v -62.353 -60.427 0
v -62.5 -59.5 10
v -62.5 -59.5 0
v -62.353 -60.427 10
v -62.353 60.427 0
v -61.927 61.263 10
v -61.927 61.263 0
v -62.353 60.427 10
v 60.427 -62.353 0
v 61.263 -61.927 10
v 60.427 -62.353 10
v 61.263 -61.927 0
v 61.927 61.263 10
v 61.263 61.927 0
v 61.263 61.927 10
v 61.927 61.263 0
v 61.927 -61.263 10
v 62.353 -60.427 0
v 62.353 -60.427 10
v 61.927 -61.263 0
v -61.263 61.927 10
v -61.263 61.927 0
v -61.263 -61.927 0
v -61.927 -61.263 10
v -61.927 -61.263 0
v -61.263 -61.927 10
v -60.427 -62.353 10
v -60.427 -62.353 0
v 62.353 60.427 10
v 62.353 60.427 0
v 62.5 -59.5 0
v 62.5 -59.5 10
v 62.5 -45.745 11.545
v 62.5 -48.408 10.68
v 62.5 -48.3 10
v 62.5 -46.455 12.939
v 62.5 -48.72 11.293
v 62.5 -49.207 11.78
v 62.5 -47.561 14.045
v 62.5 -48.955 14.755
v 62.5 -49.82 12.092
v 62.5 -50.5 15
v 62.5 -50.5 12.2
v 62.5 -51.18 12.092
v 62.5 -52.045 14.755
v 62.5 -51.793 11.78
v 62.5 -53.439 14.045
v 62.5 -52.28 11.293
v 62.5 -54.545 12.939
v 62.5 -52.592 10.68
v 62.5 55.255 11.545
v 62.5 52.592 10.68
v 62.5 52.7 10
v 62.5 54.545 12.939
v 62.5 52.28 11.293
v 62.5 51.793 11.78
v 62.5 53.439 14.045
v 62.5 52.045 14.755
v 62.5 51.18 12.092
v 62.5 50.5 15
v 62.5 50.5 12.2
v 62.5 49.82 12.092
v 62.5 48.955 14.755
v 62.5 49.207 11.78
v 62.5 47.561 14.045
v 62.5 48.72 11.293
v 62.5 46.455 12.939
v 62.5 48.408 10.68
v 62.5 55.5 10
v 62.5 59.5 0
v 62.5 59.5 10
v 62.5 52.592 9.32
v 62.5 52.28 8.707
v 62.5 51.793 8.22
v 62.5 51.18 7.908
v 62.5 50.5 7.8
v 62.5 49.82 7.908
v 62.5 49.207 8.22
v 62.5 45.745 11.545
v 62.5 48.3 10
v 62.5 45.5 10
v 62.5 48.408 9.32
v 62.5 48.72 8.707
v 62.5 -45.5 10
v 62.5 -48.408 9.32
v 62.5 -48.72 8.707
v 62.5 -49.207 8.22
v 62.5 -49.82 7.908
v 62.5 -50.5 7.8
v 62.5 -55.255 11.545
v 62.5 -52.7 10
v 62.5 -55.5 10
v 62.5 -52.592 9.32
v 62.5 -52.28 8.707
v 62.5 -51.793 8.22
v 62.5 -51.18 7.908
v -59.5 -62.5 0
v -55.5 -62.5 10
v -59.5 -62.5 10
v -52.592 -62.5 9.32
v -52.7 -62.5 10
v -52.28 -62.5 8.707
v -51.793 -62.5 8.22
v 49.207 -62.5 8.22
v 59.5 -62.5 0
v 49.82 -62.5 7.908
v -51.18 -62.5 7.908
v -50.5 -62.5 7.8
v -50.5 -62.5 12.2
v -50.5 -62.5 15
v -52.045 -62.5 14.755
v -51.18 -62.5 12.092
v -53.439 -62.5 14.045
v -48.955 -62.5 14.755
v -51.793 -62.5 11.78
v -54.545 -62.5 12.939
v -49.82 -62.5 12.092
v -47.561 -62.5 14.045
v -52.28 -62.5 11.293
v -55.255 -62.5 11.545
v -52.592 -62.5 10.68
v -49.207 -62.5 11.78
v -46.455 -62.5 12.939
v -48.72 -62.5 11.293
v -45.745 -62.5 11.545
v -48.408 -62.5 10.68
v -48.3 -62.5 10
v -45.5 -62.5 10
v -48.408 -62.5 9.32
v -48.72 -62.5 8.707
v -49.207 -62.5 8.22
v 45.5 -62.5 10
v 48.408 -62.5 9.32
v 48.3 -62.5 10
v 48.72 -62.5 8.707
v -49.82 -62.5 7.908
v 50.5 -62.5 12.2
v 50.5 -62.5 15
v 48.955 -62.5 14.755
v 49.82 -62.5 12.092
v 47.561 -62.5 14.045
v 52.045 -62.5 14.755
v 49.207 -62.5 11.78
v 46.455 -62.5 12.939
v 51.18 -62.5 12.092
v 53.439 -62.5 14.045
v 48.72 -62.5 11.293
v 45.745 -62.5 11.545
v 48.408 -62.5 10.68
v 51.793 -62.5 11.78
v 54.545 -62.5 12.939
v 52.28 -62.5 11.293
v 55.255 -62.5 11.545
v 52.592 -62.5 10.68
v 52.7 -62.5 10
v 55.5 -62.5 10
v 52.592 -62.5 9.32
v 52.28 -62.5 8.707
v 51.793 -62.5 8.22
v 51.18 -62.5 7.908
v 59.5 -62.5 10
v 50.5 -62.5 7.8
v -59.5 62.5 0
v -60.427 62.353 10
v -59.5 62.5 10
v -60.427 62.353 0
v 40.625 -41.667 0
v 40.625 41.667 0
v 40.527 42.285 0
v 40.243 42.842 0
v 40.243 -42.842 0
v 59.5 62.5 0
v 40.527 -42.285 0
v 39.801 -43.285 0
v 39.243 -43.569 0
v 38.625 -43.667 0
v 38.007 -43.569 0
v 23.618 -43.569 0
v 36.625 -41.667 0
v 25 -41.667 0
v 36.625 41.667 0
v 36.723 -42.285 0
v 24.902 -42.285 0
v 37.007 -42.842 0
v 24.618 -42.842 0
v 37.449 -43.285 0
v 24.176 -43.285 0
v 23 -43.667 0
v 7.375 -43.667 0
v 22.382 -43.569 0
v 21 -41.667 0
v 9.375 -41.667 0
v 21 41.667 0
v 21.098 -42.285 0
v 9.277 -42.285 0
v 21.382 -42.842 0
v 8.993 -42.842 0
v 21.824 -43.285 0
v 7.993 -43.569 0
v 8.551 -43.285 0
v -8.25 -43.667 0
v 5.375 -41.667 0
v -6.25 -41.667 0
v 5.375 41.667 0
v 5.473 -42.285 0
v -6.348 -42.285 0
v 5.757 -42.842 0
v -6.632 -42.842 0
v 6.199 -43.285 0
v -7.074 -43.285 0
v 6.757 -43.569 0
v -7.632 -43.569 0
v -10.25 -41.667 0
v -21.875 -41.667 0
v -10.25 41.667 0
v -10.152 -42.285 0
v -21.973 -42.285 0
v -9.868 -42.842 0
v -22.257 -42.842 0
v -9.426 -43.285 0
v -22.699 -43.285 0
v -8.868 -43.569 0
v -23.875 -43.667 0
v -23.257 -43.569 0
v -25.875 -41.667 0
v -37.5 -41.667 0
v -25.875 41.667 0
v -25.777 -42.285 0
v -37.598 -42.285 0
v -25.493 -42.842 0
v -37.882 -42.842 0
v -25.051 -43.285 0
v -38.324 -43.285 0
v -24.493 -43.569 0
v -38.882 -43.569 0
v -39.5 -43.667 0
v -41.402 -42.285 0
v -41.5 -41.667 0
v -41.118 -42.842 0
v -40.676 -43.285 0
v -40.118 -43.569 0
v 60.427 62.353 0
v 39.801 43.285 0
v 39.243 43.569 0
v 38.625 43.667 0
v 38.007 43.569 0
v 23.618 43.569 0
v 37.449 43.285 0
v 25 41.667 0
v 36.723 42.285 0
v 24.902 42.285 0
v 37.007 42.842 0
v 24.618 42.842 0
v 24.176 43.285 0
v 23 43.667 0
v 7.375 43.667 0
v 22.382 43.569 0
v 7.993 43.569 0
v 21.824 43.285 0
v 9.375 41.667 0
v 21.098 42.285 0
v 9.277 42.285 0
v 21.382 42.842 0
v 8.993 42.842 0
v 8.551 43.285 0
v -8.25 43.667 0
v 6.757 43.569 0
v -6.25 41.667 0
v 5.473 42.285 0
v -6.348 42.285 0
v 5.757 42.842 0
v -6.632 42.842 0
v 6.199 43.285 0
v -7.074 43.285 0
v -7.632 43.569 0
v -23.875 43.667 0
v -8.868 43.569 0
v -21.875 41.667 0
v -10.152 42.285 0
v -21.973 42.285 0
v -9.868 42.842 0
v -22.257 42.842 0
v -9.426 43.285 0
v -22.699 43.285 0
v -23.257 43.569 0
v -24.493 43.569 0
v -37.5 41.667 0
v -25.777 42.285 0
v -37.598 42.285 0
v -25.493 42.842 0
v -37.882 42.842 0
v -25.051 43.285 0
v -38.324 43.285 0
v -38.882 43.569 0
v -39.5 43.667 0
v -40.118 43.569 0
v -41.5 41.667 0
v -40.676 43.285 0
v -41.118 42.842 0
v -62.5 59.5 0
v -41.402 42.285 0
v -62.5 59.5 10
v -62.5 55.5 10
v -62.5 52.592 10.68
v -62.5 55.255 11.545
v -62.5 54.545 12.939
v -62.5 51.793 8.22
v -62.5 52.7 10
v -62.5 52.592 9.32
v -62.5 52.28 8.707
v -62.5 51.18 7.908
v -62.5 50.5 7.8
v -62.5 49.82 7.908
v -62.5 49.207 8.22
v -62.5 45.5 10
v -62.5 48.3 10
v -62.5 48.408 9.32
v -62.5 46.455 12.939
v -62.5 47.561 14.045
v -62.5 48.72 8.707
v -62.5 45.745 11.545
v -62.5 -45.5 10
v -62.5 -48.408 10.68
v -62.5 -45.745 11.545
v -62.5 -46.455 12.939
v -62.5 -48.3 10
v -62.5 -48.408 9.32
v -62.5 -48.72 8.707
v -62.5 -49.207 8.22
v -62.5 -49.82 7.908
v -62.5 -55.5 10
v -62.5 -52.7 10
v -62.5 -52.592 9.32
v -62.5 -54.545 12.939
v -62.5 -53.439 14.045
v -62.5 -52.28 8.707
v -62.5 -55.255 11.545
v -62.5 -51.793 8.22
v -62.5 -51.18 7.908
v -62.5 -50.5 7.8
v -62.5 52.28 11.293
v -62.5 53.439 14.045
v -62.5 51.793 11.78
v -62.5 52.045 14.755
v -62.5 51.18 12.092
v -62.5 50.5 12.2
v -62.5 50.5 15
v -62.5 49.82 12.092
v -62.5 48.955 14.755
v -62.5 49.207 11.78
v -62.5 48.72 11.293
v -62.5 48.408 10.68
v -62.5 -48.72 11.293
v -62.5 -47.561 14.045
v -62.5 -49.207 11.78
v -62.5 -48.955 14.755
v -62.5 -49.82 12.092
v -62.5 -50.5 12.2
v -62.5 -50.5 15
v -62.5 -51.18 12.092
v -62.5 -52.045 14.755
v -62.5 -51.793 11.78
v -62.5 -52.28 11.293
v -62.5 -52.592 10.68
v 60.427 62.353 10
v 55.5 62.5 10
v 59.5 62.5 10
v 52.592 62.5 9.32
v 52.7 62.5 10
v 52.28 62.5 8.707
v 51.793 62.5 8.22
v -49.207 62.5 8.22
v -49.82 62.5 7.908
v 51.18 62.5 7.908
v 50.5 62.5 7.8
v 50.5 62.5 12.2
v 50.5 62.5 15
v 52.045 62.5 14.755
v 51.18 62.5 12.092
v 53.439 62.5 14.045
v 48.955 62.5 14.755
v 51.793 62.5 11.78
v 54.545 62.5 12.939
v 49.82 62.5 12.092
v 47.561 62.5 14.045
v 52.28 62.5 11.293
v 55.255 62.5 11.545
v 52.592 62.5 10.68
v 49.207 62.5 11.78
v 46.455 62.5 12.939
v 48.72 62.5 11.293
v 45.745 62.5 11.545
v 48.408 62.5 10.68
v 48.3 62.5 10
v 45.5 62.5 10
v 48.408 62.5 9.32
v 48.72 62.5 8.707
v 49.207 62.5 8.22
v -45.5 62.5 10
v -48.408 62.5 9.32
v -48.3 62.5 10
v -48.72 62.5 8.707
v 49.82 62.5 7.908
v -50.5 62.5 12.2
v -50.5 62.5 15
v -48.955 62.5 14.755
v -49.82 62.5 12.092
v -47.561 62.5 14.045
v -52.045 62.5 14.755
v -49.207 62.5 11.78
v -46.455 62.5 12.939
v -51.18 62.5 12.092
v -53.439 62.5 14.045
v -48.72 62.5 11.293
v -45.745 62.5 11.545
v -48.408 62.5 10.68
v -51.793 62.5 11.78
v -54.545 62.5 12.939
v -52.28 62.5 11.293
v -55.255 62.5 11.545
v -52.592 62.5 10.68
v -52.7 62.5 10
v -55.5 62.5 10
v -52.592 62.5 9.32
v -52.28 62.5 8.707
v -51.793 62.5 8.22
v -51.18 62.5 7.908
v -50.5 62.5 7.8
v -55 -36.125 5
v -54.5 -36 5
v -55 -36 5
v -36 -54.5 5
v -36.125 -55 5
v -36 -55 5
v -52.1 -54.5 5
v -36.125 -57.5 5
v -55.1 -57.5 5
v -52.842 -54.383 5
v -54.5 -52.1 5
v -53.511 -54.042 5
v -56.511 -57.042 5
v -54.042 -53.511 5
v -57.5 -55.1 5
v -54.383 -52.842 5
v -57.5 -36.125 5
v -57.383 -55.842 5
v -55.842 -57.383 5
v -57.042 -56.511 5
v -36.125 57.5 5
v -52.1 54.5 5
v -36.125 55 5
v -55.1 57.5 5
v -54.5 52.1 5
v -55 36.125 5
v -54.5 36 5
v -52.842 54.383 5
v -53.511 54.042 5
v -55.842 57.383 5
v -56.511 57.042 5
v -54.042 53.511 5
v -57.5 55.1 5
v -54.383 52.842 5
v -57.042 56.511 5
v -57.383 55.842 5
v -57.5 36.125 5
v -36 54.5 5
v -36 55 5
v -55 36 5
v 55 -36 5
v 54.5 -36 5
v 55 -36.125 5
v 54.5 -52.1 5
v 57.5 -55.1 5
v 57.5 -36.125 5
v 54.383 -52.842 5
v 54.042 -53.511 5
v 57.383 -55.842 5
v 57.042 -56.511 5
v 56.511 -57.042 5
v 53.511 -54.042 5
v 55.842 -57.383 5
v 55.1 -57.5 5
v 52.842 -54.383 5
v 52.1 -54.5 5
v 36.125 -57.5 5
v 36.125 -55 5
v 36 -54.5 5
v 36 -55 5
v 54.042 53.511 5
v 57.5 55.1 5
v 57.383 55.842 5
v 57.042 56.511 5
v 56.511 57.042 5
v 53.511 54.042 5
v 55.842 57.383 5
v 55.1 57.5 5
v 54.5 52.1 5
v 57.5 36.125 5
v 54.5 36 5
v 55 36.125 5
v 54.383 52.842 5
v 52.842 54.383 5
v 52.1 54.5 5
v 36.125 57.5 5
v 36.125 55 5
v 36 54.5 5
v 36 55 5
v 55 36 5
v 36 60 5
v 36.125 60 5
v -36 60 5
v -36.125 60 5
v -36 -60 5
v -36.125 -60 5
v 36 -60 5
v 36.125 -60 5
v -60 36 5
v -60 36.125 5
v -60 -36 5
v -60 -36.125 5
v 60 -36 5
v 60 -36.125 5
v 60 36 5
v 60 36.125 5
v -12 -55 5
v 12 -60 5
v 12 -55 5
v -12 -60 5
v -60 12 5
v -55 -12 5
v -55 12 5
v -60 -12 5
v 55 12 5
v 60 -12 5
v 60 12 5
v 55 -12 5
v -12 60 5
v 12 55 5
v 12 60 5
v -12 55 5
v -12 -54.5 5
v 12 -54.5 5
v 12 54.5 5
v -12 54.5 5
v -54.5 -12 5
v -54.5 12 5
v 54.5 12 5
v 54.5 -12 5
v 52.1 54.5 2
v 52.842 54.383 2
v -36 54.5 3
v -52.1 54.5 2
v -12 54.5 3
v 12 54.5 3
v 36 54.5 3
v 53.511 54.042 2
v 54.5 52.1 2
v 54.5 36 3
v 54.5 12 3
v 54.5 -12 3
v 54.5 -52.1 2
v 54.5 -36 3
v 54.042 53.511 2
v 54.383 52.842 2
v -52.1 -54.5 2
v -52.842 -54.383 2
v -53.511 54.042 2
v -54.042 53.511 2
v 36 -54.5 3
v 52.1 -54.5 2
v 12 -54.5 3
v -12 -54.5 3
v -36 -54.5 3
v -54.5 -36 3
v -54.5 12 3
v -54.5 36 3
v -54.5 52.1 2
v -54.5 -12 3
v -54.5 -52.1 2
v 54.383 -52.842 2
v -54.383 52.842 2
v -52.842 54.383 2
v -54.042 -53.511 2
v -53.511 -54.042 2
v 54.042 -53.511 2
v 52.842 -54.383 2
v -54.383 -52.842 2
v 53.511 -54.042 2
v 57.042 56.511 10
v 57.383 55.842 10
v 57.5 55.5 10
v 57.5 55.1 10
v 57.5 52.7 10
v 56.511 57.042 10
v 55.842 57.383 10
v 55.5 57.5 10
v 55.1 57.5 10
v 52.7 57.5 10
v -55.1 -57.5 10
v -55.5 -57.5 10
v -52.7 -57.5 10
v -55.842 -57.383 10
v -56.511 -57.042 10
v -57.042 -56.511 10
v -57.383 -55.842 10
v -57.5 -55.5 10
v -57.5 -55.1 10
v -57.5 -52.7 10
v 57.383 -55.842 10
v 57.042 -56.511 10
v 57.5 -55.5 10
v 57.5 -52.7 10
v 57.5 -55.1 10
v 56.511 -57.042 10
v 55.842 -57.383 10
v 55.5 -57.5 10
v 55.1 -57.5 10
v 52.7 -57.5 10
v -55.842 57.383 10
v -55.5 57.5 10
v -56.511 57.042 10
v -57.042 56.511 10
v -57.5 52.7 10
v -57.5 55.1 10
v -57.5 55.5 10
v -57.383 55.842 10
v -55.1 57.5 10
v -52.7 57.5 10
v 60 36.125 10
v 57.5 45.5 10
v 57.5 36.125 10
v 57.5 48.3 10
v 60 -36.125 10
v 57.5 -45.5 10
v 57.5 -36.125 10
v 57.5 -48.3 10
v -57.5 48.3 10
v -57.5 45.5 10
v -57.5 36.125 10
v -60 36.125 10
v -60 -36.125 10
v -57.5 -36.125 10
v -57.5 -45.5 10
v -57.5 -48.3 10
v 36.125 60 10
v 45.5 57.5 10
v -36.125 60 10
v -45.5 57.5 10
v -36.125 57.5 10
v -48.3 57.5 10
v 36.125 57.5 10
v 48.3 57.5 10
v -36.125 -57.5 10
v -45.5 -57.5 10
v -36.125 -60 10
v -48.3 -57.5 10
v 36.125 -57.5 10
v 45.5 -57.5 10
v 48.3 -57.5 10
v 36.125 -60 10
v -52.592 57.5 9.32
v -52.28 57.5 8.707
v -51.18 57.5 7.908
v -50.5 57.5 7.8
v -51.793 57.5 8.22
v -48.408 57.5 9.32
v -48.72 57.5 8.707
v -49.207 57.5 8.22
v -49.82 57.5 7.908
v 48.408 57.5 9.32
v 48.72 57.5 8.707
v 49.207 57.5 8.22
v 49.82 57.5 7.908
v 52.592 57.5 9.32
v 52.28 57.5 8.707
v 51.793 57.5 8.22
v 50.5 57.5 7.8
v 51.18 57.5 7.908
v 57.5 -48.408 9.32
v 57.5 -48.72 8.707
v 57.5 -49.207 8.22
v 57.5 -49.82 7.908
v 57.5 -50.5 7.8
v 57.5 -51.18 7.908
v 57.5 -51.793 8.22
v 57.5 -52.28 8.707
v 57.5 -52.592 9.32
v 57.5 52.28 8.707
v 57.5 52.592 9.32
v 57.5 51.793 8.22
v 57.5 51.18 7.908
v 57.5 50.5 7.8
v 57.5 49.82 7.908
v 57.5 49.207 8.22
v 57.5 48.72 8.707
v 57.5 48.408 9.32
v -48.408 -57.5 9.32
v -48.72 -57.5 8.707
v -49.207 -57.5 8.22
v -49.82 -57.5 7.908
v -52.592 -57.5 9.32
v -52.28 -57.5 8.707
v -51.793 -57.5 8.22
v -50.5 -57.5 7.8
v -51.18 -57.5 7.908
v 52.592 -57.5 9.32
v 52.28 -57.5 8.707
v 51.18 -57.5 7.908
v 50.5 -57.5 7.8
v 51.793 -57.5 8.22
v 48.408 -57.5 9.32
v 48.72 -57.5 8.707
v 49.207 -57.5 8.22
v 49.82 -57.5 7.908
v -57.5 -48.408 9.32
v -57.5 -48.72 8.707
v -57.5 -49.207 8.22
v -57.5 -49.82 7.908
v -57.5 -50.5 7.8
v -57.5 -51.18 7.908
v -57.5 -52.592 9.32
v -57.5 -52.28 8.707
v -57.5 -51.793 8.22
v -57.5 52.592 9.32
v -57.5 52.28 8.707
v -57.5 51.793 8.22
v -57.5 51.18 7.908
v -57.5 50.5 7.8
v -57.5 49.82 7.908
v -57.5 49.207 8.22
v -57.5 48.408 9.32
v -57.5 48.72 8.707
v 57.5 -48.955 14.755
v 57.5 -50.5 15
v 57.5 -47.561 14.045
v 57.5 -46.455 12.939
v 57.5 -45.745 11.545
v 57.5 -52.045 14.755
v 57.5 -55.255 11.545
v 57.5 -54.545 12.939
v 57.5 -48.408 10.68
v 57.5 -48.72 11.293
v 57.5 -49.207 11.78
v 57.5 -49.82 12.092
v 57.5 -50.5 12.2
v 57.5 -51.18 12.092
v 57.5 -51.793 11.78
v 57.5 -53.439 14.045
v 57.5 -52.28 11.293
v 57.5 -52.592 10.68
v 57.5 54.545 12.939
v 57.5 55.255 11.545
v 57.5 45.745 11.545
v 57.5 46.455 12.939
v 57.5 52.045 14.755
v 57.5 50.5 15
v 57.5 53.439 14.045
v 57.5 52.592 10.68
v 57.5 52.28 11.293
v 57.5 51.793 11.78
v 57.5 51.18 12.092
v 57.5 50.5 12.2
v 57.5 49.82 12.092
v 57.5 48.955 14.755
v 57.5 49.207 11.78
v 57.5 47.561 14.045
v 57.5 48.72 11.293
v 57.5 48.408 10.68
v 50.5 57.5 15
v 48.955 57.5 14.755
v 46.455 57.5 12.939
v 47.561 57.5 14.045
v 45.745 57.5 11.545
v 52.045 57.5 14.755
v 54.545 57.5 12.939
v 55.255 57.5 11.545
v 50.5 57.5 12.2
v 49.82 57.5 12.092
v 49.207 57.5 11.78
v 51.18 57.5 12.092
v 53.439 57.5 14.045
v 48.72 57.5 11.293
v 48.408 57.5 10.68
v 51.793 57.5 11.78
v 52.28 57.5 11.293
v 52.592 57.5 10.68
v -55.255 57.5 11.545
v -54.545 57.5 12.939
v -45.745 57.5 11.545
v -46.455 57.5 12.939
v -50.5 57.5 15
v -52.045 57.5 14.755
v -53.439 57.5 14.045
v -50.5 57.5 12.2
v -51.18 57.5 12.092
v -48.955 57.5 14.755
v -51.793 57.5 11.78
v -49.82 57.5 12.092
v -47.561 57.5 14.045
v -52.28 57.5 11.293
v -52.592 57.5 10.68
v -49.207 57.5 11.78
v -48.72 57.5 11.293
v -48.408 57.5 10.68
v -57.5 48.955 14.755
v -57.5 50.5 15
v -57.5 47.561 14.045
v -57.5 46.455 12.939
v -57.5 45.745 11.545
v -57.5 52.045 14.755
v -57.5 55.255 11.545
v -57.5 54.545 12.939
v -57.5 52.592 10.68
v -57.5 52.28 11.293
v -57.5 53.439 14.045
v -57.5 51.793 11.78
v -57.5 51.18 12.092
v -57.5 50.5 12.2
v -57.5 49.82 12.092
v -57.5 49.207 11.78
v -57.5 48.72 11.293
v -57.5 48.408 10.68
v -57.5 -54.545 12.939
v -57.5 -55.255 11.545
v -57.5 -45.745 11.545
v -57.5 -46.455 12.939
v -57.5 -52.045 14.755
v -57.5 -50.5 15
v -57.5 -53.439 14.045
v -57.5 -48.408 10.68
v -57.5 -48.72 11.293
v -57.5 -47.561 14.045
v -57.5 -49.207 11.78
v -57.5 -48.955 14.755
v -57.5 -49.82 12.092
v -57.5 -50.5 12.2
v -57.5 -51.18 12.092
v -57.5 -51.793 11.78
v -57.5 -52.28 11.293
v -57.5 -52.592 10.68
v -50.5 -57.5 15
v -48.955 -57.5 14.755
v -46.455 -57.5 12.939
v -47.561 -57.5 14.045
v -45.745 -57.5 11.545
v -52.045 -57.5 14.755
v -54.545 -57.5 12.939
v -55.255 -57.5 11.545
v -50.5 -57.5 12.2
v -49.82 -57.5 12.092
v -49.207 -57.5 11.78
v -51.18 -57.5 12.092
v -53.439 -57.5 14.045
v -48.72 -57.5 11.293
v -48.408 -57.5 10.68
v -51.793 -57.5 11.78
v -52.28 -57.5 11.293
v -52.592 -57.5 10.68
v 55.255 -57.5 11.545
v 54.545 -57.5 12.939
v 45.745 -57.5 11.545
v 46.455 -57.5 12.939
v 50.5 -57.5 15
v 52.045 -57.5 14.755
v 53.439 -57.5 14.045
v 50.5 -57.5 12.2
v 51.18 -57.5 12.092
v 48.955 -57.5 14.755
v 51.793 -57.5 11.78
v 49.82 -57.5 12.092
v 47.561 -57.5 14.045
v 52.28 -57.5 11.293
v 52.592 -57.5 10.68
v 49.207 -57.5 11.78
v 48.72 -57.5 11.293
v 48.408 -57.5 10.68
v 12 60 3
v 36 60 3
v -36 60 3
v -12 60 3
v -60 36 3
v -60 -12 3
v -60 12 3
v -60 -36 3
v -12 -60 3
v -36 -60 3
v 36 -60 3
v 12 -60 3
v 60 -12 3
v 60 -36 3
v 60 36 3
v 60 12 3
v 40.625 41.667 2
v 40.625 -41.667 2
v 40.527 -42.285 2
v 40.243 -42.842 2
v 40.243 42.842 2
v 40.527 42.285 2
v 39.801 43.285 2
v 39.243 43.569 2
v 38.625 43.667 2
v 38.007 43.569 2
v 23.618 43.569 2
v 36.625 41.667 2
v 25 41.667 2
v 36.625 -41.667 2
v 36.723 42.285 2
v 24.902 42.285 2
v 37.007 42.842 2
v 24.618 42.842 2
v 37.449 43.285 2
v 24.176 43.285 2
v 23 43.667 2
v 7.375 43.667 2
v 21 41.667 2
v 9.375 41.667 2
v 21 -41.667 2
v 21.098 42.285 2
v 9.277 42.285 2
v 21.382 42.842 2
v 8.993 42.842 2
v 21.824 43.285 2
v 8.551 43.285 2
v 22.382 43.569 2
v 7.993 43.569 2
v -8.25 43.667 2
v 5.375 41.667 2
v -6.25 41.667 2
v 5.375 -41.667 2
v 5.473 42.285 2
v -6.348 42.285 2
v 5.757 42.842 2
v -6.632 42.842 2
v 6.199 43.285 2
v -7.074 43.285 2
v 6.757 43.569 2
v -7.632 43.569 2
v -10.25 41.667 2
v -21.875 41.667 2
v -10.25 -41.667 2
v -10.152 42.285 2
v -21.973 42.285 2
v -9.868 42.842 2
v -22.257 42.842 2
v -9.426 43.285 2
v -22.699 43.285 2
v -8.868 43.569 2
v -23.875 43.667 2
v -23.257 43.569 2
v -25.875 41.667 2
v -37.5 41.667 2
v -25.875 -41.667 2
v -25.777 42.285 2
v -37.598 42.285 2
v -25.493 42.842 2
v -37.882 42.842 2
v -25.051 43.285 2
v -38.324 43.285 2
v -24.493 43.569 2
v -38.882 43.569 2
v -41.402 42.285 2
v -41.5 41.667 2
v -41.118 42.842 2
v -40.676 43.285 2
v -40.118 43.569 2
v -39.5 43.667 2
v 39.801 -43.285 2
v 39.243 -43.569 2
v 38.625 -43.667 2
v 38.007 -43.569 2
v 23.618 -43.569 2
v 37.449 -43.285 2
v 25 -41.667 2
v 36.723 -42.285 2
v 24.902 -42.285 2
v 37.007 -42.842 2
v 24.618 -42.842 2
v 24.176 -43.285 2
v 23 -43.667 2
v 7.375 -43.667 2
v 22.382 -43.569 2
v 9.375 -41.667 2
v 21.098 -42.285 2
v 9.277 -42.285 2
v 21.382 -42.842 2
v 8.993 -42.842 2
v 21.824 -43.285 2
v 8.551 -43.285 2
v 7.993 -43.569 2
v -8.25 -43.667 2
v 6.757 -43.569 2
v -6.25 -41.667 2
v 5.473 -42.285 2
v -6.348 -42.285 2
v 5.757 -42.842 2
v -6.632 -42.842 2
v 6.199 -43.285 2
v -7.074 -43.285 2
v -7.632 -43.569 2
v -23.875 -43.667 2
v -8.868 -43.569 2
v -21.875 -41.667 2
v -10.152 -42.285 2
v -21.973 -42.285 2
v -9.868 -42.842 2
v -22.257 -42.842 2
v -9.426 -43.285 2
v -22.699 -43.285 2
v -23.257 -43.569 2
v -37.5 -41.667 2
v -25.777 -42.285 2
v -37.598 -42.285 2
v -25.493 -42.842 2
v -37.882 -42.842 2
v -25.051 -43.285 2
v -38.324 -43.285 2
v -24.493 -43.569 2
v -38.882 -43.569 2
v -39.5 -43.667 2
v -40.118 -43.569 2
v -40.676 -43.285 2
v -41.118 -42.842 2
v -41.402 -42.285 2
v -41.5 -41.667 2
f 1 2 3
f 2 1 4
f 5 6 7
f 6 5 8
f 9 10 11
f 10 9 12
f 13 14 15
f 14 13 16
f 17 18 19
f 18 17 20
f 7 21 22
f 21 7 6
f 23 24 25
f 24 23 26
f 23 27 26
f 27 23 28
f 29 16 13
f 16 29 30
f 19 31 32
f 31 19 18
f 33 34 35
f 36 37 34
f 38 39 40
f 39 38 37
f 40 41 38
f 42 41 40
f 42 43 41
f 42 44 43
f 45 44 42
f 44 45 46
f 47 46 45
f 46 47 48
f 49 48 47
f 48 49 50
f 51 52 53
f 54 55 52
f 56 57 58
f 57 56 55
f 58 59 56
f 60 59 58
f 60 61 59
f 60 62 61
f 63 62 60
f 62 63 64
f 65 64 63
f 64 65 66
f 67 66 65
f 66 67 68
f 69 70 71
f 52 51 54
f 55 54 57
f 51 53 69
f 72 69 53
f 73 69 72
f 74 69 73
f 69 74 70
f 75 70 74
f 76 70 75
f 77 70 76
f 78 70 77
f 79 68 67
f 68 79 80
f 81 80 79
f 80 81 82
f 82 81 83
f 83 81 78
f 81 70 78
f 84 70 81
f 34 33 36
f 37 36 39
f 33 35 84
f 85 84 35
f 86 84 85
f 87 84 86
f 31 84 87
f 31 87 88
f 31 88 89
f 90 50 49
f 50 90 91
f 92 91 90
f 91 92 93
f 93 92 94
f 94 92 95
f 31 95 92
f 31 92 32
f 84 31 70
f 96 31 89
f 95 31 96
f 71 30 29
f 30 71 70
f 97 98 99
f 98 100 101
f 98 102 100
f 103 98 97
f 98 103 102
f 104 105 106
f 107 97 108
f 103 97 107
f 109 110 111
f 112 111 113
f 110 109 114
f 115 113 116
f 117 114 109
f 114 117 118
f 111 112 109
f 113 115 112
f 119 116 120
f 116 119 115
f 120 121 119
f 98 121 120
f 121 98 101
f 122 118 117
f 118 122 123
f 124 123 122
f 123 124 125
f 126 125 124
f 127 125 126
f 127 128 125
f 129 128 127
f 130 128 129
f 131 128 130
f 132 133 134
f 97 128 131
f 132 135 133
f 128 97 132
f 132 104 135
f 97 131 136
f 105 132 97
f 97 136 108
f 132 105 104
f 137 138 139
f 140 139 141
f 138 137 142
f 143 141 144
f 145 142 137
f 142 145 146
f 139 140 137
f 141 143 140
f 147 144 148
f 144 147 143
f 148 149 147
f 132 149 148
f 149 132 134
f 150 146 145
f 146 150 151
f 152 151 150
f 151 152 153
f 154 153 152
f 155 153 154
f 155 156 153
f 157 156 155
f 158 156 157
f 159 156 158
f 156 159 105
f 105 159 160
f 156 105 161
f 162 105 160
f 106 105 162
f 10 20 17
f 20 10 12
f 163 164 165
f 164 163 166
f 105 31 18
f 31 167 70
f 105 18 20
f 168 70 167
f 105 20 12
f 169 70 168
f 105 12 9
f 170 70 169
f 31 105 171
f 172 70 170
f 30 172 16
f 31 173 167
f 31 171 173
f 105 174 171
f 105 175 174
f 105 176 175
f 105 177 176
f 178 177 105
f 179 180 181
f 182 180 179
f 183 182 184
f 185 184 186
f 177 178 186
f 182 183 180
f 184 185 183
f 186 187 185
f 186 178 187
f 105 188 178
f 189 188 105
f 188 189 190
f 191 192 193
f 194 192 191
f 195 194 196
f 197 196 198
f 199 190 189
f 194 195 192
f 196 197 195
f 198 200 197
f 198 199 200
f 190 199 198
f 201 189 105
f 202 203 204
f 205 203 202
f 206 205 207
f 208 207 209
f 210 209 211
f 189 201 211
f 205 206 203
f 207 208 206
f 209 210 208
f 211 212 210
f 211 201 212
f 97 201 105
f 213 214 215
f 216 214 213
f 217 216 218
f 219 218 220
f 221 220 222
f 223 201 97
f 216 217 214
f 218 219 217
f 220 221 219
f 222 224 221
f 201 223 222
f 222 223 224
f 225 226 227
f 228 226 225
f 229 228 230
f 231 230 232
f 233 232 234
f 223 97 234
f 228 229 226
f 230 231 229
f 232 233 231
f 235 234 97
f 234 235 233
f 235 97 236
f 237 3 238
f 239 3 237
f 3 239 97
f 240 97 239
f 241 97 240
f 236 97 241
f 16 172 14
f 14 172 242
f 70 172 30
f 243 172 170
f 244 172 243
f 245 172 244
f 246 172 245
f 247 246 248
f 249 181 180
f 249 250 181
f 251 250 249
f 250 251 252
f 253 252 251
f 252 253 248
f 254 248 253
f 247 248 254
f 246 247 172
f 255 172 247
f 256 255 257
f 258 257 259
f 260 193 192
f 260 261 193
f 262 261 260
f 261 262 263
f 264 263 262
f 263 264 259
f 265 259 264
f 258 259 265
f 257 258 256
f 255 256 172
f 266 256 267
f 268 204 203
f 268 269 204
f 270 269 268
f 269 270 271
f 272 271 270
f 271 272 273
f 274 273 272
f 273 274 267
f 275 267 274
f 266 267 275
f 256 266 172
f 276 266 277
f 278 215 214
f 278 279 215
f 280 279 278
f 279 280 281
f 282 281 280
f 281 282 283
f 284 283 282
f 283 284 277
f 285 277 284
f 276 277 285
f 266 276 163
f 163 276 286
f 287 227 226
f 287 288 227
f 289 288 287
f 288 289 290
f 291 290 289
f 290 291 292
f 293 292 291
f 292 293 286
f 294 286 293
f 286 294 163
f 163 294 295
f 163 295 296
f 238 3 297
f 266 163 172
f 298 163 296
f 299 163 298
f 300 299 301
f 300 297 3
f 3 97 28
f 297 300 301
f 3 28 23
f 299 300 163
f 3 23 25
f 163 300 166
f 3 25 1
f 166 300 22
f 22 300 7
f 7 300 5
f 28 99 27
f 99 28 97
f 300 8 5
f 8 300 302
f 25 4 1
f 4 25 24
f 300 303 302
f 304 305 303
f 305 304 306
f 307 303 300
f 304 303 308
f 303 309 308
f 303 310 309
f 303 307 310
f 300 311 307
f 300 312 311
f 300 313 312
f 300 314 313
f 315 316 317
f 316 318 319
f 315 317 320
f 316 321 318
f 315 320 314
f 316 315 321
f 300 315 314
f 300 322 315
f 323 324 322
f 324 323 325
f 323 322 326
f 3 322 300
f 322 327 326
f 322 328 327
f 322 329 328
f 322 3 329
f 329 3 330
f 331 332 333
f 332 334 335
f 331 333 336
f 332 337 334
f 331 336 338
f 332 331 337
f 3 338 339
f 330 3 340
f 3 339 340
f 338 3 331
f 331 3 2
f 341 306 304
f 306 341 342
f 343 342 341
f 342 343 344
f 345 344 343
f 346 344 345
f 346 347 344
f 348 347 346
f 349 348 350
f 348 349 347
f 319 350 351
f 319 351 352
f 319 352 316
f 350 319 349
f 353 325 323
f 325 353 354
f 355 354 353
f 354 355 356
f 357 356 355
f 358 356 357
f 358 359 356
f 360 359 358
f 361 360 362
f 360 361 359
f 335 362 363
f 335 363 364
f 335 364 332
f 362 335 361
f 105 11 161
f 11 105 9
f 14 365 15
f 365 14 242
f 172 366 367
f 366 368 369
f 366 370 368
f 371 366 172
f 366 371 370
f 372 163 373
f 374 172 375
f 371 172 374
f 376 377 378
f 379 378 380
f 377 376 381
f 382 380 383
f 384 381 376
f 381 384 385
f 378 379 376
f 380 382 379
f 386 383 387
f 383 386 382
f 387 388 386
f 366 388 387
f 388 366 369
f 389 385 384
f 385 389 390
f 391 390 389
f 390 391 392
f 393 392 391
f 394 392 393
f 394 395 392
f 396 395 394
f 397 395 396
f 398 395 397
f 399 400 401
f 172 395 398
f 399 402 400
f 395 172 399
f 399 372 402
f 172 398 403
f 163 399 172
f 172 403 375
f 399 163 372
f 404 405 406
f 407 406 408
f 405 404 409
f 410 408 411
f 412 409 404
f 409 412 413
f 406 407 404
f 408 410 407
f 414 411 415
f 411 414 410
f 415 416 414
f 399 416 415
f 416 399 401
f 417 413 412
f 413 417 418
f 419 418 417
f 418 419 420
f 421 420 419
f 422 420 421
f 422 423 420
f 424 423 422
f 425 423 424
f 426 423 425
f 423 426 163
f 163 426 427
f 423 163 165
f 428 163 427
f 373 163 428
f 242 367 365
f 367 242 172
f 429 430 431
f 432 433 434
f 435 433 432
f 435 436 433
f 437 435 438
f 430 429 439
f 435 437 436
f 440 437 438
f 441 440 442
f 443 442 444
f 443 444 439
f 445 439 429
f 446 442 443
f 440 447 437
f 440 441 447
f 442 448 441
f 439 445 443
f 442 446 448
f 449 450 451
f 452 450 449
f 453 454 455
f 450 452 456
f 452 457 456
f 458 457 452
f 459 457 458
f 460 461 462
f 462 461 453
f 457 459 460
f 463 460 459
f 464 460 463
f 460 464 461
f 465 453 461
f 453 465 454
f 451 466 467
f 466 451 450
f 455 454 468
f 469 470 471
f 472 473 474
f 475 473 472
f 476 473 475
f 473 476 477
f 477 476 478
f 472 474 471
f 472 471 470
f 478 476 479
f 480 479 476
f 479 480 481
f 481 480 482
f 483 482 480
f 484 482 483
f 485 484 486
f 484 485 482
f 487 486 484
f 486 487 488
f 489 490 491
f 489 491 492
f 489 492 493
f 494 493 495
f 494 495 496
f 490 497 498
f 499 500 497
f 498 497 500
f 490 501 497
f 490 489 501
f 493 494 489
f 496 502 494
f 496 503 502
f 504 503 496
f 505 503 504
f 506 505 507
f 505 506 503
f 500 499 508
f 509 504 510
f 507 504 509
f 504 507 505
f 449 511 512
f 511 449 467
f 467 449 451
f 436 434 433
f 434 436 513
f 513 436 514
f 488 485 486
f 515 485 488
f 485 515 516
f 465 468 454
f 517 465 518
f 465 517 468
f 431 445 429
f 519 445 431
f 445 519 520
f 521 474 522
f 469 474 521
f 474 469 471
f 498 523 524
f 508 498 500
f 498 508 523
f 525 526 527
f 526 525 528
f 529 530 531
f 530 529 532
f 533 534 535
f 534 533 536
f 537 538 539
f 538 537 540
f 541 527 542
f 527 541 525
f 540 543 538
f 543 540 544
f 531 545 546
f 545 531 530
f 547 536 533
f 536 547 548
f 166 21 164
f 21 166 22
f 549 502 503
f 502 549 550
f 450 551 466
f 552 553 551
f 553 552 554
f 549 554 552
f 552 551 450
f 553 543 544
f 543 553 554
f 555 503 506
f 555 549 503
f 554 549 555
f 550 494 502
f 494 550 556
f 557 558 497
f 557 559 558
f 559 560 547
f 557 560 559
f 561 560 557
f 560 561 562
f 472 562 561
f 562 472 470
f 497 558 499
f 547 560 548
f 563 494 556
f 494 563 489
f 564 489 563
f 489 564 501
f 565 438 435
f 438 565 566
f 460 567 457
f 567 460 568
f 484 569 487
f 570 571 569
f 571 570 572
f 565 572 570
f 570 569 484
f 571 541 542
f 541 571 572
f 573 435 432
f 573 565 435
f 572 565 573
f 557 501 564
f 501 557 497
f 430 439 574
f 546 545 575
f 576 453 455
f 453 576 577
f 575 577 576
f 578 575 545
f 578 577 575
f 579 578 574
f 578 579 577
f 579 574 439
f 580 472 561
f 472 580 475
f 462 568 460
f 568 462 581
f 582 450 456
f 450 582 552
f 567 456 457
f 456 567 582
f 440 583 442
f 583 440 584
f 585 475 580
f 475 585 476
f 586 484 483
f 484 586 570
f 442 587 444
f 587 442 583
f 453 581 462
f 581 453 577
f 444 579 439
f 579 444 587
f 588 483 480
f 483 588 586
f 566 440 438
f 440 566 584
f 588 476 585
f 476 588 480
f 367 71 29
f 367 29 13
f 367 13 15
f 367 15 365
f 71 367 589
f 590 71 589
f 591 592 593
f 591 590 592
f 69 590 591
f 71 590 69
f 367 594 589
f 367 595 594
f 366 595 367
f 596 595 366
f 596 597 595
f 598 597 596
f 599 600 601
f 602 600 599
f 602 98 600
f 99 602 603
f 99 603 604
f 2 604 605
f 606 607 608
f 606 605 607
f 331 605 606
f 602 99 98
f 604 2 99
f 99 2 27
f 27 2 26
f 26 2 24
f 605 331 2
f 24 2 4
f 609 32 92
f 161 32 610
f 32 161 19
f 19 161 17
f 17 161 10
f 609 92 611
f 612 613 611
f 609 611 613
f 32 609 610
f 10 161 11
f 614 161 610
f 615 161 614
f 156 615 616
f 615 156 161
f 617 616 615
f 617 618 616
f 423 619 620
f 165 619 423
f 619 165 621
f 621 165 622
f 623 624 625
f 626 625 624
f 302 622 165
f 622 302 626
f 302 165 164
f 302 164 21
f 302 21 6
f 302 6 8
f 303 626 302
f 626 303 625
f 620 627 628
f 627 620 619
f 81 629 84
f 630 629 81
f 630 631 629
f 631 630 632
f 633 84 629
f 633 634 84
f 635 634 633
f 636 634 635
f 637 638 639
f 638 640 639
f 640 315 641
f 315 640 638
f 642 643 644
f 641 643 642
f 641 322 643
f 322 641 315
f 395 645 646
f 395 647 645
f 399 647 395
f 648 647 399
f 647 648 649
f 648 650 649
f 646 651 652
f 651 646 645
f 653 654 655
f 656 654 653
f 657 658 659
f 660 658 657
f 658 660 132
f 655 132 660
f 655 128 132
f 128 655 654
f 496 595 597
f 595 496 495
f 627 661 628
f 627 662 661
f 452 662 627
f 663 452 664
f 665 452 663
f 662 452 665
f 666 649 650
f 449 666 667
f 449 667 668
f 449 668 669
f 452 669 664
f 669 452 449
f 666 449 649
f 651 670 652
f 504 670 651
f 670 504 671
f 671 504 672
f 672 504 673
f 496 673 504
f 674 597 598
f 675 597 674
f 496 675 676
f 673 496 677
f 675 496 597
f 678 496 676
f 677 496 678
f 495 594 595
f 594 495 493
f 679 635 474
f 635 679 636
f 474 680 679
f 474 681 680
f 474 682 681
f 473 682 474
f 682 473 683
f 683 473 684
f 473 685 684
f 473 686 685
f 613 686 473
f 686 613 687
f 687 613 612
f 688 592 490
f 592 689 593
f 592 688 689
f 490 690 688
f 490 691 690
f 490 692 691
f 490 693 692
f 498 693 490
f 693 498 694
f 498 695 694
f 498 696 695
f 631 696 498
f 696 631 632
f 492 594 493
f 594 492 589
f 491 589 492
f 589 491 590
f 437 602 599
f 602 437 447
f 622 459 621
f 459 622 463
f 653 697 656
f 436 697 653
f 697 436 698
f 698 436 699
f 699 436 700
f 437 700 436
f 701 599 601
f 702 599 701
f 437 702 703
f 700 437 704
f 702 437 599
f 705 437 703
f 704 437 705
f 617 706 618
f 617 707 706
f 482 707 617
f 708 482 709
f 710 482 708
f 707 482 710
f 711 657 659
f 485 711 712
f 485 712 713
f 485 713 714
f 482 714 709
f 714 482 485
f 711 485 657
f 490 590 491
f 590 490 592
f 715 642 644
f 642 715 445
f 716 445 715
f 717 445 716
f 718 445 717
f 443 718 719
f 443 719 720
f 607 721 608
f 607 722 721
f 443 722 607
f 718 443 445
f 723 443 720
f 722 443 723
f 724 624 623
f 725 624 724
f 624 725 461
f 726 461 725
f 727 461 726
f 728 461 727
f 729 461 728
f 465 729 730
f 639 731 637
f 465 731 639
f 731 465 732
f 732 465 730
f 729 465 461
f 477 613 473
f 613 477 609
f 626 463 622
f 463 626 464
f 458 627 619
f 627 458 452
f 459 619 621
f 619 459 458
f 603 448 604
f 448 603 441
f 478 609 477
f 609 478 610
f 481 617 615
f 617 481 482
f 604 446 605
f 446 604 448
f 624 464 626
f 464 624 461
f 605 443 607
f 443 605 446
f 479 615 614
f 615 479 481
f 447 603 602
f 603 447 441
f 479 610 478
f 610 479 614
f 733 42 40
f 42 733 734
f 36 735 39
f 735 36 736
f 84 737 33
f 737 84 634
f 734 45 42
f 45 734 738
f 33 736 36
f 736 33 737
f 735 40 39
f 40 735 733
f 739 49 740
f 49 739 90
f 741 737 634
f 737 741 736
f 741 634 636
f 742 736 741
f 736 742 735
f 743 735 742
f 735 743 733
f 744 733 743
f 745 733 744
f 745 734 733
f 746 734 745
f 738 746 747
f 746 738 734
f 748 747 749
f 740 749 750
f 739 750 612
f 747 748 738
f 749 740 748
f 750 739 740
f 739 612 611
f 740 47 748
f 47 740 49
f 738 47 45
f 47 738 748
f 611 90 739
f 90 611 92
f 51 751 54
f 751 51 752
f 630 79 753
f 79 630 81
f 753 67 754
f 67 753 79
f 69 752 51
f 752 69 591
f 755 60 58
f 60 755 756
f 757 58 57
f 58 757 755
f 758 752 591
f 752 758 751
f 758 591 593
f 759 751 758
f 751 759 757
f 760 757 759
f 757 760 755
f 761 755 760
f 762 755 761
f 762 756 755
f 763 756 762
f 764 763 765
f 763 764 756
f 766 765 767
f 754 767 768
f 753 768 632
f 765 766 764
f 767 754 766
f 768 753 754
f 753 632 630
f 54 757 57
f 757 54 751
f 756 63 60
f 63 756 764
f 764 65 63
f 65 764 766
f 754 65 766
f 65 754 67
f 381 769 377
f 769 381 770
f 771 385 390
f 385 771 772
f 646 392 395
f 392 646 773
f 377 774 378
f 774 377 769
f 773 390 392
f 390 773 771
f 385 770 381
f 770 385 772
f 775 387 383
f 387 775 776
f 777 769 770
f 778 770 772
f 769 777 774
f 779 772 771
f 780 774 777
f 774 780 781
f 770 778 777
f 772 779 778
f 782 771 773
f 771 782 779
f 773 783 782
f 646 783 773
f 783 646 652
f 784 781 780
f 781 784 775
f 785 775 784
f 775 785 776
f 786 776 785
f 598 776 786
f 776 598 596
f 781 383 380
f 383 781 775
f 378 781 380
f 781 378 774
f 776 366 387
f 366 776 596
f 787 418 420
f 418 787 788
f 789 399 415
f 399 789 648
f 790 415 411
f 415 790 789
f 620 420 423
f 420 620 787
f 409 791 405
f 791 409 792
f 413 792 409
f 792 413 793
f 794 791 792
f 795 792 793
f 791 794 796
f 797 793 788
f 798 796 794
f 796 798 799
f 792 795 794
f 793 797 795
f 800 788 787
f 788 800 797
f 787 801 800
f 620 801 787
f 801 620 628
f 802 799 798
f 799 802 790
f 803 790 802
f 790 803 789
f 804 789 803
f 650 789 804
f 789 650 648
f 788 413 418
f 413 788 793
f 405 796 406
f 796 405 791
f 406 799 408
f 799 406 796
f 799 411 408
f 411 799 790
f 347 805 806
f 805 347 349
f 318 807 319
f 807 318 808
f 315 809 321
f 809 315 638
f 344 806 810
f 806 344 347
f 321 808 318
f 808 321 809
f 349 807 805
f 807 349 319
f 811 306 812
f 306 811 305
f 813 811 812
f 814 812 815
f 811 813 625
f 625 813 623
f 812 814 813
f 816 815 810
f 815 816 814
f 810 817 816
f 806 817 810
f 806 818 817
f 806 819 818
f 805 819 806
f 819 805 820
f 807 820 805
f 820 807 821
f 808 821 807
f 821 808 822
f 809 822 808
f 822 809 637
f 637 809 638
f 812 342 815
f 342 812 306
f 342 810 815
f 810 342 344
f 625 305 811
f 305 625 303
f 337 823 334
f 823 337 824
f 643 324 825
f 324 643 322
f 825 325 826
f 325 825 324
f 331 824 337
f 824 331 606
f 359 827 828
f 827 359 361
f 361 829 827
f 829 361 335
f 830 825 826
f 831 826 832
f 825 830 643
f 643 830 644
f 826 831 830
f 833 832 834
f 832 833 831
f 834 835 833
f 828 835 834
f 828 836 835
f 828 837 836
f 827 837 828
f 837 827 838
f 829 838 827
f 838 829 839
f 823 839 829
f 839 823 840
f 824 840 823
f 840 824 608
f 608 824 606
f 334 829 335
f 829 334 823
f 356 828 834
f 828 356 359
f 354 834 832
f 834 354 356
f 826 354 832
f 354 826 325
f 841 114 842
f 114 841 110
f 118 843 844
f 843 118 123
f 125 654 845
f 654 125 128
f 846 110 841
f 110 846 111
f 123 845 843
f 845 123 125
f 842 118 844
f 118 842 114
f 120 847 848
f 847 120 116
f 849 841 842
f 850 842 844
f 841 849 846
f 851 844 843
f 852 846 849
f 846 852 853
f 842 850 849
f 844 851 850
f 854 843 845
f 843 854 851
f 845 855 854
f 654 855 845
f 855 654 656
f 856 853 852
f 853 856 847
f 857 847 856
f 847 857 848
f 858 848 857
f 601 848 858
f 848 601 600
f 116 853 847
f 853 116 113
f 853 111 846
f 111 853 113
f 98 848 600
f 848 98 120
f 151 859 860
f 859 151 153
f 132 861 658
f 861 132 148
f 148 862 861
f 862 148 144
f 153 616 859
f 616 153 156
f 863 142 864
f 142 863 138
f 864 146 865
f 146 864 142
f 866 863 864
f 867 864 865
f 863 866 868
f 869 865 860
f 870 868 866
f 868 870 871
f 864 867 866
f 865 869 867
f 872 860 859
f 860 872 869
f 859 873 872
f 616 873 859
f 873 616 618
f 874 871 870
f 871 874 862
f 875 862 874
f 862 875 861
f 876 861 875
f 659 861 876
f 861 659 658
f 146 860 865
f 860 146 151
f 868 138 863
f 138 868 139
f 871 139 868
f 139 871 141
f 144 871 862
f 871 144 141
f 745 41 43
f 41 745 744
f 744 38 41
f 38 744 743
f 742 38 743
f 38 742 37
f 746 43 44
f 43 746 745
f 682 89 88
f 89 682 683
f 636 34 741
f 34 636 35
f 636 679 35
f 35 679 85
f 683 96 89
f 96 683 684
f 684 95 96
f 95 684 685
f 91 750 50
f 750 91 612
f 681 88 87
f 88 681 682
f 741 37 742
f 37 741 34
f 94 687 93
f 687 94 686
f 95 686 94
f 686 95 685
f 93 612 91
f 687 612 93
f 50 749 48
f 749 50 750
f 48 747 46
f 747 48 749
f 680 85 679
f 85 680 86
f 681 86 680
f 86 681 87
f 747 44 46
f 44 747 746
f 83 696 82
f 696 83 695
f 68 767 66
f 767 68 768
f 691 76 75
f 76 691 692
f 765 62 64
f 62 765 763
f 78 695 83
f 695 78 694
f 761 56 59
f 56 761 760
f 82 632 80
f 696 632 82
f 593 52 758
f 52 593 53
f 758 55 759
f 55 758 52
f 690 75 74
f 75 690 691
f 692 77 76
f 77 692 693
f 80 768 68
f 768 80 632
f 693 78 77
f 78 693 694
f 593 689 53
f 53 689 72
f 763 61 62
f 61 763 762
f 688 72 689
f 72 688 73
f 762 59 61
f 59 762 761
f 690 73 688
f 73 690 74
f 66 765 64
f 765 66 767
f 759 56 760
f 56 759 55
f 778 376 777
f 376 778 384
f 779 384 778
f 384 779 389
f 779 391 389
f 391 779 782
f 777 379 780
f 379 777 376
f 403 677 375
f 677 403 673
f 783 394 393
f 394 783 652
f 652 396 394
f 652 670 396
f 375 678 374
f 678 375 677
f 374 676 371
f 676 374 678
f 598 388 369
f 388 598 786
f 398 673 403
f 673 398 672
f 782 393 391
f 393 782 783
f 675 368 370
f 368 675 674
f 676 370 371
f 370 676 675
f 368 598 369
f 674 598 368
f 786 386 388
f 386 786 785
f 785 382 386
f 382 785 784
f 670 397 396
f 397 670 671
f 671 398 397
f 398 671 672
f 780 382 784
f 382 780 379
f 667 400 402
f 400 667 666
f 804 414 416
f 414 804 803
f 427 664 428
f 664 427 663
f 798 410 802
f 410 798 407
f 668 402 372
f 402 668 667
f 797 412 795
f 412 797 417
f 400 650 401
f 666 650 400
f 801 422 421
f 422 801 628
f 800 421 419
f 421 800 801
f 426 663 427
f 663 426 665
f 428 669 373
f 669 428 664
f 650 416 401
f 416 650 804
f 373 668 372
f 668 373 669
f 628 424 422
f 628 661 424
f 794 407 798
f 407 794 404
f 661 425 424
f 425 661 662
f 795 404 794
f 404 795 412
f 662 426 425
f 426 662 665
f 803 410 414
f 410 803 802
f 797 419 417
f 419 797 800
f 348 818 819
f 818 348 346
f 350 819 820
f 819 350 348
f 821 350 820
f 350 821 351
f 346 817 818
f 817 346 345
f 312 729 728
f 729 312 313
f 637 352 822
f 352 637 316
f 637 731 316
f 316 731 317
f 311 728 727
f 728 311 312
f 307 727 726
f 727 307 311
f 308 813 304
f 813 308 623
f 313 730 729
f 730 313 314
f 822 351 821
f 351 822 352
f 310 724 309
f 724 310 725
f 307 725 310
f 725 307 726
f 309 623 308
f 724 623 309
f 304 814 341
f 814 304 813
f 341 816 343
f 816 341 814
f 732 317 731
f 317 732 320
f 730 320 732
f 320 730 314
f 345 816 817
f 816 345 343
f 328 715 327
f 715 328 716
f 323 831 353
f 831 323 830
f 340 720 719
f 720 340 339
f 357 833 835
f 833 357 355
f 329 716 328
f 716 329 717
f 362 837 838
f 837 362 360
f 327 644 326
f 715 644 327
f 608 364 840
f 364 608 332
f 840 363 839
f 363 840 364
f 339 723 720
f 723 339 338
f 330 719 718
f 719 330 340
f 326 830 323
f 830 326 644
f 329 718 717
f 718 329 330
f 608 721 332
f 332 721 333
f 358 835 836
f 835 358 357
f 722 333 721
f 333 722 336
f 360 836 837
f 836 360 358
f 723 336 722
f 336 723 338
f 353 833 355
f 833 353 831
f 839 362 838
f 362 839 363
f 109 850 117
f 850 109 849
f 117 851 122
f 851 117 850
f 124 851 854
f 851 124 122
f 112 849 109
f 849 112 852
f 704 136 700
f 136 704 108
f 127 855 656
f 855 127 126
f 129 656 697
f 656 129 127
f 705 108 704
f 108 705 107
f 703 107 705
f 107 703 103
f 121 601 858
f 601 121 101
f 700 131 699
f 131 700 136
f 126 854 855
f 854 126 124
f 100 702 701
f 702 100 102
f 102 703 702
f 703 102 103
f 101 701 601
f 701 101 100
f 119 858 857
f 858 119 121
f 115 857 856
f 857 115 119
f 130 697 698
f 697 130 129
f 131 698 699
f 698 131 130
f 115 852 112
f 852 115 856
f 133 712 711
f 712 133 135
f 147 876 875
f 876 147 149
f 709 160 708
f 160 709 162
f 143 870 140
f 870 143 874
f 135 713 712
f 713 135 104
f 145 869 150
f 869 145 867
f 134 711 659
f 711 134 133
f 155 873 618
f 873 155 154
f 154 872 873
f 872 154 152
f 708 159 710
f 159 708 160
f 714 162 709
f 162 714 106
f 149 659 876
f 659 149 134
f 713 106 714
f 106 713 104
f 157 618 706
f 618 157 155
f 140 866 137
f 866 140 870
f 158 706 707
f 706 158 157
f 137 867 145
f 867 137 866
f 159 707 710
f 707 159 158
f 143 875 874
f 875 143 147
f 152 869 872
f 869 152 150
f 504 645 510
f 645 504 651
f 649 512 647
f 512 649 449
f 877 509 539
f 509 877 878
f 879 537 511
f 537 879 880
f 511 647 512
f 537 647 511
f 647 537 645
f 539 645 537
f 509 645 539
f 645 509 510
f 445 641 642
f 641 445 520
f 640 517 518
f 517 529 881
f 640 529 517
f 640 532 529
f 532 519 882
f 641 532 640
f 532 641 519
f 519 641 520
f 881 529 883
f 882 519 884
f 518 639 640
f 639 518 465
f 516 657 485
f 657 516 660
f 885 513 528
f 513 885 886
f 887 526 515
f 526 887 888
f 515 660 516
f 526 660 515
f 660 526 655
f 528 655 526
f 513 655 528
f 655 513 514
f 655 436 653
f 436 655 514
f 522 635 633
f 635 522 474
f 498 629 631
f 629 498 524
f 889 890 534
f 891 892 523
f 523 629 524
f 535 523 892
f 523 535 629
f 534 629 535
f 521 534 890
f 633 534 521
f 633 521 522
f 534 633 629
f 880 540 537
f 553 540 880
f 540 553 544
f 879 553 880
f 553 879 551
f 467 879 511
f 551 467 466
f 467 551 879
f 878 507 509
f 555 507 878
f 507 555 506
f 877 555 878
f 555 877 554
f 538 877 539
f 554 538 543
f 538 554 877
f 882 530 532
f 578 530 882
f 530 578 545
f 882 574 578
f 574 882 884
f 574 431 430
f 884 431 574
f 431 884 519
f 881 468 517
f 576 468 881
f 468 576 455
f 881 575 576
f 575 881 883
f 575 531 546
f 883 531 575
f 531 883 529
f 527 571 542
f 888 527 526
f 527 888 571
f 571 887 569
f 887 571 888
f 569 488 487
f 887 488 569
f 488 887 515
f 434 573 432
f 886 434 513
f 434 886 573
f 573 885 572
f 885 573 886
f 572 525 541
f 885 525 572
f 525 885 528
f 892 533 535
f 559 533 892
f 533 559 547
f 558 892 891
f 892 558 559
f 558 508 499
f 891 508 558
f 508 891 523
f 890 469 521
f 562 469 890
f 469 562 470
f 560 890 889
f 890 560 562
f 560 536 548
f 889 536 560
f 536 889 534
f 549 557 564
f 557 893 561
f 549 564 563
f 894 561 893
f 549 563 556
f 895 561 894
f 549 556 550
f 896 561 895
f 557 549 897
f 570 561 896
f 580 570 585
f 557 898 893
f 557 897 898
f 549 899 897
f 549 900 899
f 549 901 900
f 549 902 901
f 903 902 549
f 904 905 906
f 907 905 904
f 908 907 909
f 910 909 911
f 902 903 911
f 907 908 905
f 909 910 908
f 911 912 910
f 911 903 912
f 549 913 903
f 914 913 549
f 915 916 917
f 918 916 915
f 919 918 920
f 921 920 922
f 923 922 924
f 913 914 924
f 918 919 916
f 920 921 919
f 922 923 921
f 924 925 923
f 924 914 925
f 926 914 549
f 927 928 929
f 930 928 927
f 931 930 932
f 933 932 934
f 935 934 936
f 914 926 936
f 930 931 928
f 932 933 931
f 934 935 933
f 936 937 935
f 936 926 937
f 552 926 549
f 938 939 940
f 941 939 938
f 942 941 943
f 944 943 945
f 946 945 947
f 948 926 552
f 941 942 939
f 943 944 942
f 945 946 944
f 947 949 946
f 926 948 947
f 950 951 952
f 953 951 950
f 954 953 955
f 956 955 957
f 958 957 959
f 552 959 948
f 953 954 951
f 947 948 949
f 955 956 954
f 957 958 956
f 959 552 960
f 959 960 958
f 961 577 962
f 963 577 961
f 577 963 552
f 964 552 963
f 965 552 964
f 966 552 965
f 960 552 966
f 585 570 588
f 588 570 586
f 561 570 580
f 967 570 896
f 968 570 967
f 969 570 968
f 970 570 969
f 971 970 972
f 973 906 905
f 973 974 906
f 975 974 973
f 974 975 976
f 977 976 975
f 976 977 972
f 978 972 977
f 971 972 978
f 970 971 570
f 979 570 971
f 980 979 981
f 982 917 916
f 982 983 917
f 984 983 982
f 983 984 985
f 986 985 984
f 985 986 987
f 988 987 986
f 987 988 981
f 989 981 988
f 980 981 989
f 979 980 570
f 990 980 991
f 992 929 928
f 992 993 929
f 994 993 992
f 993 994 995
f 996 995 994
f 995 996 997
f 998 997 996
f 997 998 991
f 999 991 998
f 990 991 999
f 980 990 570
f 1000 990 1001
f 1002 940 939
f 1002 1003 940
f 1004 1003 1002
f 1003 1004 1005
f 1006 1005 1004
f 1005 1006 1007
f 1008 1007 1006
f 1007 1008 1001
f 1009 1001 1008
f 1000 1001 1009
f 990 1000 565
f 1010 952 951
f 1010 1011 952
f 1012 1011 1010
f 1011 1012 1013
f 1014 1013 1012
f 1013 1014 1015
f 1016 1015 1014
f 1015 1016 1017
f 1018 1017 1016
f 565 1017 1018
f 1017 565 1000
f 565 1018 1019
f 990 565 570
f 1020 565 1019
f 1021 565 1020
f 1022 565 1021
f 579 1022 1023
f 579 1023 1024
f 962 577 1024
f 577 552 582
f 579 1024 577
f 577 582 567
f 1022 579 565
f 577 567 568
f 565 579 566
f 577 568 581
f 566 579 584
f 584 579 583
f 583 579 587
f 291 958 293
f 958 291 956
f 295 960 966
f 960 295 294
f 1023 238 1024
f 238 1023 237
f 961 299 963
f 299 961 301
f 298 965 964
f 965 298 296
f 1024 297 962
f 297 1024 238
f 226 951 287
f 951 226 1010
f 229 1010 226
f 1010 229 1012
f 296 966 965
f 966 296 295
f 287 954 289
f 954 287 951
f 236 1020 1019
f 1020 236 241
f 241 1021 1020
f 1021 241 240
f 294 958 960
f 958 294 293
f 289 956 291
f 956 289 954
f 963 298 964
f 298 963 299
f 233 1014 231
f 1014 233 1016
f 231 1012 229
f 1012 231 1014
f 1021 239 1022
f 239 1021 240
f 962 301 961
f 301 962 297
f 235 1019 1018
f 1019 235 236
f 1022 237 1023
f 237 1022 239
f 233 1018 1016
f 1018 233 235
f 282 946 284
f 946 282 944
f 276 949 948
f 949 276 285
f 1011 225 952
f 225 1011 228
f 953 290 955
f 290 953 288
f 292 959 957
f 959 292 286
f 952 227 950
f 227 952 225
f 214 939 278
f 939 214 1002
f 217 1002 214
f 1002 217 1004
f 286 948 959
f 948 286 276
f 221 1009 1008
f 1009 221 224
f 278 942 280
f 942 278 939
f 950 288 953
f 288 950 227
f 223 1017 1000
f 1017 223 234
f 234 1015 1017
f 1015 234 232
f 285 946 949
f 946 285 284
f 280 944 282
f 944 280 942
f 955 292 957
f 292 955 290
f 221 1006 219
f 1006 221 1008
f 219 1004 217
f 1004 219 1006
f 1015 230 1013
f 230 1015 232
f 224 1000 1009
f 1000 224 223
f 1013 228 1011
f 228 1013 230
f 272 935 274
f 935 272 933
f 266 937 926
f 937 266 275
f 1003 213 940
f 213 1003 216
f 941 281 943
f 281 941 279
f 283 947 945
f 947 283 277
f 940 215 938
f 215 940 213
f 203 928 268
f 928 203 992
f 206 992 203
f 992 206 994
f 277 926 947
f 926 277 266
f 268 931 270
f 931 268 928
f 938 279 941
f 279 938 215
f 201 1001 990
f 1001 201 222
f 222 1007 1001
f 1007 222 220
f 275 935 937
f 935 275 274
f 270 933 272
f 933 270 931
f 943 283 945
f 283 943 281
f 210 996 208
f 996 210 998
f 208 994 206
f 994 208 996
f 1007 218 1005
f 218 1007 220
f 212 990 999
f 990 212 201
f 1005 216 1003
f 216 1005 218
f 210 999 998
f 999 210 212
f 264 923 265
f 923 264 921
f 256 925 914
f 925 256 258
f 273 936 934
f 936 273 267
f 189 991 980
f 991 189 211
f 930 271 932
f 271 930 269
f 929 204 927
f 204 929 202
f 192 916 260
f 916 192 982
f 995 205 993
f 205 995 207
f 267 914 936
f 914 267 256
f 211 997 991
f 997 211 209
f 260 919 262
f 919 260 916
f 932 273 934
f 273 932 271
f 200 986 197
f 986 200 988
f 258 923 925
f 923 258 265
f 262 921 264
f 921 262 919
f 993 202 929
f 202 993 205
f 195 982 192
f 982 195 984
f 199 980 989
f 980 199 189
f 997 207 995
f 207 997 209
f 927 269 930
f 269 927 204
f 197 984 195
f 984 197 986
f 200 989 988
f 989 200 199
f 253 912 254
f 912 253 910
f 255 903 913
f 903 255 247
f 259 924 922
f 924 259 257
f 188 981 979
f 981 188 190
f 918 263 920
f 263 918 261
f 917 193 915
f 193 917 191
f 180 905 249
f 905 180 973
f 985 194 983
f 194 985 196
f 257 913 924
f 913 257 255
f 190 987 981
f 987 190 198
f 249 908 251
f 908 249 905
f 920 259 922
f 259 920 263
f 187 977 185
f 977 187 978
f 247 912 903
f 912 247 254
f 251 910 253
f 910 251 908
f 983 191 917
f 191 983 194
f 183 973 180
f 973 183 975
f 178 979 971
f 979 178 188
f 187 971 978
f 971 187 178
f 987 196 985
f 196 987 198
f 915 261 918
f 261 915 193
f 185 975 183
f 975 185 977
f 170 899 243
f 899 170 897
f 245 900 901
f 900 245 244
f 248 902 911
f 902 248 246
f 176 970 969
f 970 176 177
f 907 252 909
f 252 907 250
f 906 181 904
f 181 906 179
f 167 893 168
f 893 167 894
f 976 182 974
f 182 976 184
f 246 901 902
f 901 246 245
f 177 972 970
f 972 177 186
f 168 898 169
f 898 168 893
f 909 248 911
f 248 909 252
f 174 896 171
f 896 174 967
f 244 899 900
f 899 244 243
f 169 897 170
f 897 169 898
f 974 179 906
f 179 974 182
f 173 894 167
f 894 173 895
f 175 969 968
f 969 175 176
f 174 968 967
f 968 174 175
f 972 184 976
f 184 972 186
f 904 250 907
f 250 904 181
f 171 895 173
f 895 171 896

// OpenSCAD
// file: baseframe.scad
module Centerframe(W,R,D,T,H,O, Nb = [0,1,2,3], Nm = [0,1,2,3], Rm = 2.2){ 
   
    difference(){
    union(){
    base(W,R,D,T);
    translate([0,0,D]){
        base(W,R,H,D);
    }
    
    sideHoleSupports(5,W,D,O);
    }
    
    translate([0,0,-4*D]){
    sideHoleSupports(Rm,W,3*D,O);
    }
    
    for(i = [0:3]){
        rotate([0,0,90*i]){
        translate([-(0.85*W-2*O-10)/2,W/2-D-0.5*D,D]){ 
        cube([0.85*W-2*O-10,D,1.5*D]);}}
    }
    
    for(i = [0:3]){
    rotate([0,0,90*i]){
    union(){
    translate([-12-(0.5*W-2*O-14.5),W/2-D-0.5*D-D,3]){ 
    cube([0.5*W-2*O-14.5,2*D,1.5*D]);}
    translate([12,W/2-D-0.5*D-D,3]){ 
    cube([0.5*W-2*O-14.5,2*D,1.5*D]);}}}
    }
    
    }
    
    for(i = Nb){
        rotate([0,0,90*i]){
            bottomHoleSupport(R,W,D,Rm);
        }
    }
    
    for(i = Nm){
        rotate([0,0,90*i]){
            midHoleSupports(0.95*R,W,D,Rm);
        }
    }
    
}

module midHoleSupports(R,W,D,Rm){
    translate([0,-W/2+4,D/2]){
    difference(){
        union(){
    translate([-12,2,0]){baseRectangle(10,R,D);}
    translate([-5,2,0]){baseRectangle(10,R,D);}
    translate([2,2,0]){baseRectangle(10,R,D);}
    translate([0,2,0]){baseRectangle(10,R,D);}
    translate([-10,2,0]){baseRectangle(10,R,D);}
    }
    translate([-7.5,8,-D]){cylinder(2*D,Rm,Rm);}
    translate([7.5,8,-D]){cylinder(2*D,Rm,Rm);}
    }
    }
}   

module sideHoleSupports(R,W,D,O){
    for(j = [0:3]){
        rotate([0,0,90*j]){
    for(i = [0:1]){
    translate([W/2-D,-W/2 + O + i*(W-2*O),2*D]){
        rotate([0,90,0]){
        cylinder(D,R,R);
        }
    }
    }
    }   
}
}

module base(W,R,D,T){
    
    translate([-W/2,-W/2,0]){
    translate([0,0,D/2]){
    difference(){
    baseRectangle(W,R,D);
    
    translate([T,T,0]){
    baseRectangle(W-2*T,0.8*R,2*D);}
    }
    }
    }
}

module bottomHoleSupport(R,W,D,Rm){
    
    translate([W/2-R+1,W/2-R+1,D/2]){
    rotate([0,0,180]){
        difference(){
            baseRectangle(O+3,5,D);
            translate([O-2,O-2,0]){
            cylinder(2*D,Rm*0.9,Rm*1.1,center = true);
    }
    }
    }
    }
}

module baseRectangle(W,R,D){
    translate([0,0,-D/2]){
    linear_extrude(D){
        rounded_square(W,R);
    }
    }
}
// file: roundsquare.scad
module rounded_square( W, R ) {
	translate( [ R, R, 0 ] )
		minkowski() {
			square( W - 2 * R );
			circle( R );
		}
}
// main file
include <roundsquare.scad>;
include <baseframe.scad>;
include <roundsquare.scad>;
//import("bridge.stl");

$fn=20;

W = 125;  // width of base plate
R = 3;    // corner radius base plate
D = 5;    // thickness of walls
T = 8;    // thickness bottom plateau
H = 5;
O = 12; // side hole offset


color([0.4,0.4,0.4])
render(){
    
    difference(){
    union(){
    Centerframe(W,R,D,T,H,O,Nm = [],Nb = []);
    translate([0,0,1]){cube([W-O,W-O,2],center =  true);}}
    
    for(ii = [0:5]){
    translate([-0.5*W +23,0,0]){
    translate([0.5*W/4*(ii),0,0]){
    hull(){
    translate([0,W/3,0]){cylinder(8,2,2,center = true);}
    translate([0,-W/3,0]){cylinder(8,2,2,center = true);}
    }    }    }}
    
    }
}
